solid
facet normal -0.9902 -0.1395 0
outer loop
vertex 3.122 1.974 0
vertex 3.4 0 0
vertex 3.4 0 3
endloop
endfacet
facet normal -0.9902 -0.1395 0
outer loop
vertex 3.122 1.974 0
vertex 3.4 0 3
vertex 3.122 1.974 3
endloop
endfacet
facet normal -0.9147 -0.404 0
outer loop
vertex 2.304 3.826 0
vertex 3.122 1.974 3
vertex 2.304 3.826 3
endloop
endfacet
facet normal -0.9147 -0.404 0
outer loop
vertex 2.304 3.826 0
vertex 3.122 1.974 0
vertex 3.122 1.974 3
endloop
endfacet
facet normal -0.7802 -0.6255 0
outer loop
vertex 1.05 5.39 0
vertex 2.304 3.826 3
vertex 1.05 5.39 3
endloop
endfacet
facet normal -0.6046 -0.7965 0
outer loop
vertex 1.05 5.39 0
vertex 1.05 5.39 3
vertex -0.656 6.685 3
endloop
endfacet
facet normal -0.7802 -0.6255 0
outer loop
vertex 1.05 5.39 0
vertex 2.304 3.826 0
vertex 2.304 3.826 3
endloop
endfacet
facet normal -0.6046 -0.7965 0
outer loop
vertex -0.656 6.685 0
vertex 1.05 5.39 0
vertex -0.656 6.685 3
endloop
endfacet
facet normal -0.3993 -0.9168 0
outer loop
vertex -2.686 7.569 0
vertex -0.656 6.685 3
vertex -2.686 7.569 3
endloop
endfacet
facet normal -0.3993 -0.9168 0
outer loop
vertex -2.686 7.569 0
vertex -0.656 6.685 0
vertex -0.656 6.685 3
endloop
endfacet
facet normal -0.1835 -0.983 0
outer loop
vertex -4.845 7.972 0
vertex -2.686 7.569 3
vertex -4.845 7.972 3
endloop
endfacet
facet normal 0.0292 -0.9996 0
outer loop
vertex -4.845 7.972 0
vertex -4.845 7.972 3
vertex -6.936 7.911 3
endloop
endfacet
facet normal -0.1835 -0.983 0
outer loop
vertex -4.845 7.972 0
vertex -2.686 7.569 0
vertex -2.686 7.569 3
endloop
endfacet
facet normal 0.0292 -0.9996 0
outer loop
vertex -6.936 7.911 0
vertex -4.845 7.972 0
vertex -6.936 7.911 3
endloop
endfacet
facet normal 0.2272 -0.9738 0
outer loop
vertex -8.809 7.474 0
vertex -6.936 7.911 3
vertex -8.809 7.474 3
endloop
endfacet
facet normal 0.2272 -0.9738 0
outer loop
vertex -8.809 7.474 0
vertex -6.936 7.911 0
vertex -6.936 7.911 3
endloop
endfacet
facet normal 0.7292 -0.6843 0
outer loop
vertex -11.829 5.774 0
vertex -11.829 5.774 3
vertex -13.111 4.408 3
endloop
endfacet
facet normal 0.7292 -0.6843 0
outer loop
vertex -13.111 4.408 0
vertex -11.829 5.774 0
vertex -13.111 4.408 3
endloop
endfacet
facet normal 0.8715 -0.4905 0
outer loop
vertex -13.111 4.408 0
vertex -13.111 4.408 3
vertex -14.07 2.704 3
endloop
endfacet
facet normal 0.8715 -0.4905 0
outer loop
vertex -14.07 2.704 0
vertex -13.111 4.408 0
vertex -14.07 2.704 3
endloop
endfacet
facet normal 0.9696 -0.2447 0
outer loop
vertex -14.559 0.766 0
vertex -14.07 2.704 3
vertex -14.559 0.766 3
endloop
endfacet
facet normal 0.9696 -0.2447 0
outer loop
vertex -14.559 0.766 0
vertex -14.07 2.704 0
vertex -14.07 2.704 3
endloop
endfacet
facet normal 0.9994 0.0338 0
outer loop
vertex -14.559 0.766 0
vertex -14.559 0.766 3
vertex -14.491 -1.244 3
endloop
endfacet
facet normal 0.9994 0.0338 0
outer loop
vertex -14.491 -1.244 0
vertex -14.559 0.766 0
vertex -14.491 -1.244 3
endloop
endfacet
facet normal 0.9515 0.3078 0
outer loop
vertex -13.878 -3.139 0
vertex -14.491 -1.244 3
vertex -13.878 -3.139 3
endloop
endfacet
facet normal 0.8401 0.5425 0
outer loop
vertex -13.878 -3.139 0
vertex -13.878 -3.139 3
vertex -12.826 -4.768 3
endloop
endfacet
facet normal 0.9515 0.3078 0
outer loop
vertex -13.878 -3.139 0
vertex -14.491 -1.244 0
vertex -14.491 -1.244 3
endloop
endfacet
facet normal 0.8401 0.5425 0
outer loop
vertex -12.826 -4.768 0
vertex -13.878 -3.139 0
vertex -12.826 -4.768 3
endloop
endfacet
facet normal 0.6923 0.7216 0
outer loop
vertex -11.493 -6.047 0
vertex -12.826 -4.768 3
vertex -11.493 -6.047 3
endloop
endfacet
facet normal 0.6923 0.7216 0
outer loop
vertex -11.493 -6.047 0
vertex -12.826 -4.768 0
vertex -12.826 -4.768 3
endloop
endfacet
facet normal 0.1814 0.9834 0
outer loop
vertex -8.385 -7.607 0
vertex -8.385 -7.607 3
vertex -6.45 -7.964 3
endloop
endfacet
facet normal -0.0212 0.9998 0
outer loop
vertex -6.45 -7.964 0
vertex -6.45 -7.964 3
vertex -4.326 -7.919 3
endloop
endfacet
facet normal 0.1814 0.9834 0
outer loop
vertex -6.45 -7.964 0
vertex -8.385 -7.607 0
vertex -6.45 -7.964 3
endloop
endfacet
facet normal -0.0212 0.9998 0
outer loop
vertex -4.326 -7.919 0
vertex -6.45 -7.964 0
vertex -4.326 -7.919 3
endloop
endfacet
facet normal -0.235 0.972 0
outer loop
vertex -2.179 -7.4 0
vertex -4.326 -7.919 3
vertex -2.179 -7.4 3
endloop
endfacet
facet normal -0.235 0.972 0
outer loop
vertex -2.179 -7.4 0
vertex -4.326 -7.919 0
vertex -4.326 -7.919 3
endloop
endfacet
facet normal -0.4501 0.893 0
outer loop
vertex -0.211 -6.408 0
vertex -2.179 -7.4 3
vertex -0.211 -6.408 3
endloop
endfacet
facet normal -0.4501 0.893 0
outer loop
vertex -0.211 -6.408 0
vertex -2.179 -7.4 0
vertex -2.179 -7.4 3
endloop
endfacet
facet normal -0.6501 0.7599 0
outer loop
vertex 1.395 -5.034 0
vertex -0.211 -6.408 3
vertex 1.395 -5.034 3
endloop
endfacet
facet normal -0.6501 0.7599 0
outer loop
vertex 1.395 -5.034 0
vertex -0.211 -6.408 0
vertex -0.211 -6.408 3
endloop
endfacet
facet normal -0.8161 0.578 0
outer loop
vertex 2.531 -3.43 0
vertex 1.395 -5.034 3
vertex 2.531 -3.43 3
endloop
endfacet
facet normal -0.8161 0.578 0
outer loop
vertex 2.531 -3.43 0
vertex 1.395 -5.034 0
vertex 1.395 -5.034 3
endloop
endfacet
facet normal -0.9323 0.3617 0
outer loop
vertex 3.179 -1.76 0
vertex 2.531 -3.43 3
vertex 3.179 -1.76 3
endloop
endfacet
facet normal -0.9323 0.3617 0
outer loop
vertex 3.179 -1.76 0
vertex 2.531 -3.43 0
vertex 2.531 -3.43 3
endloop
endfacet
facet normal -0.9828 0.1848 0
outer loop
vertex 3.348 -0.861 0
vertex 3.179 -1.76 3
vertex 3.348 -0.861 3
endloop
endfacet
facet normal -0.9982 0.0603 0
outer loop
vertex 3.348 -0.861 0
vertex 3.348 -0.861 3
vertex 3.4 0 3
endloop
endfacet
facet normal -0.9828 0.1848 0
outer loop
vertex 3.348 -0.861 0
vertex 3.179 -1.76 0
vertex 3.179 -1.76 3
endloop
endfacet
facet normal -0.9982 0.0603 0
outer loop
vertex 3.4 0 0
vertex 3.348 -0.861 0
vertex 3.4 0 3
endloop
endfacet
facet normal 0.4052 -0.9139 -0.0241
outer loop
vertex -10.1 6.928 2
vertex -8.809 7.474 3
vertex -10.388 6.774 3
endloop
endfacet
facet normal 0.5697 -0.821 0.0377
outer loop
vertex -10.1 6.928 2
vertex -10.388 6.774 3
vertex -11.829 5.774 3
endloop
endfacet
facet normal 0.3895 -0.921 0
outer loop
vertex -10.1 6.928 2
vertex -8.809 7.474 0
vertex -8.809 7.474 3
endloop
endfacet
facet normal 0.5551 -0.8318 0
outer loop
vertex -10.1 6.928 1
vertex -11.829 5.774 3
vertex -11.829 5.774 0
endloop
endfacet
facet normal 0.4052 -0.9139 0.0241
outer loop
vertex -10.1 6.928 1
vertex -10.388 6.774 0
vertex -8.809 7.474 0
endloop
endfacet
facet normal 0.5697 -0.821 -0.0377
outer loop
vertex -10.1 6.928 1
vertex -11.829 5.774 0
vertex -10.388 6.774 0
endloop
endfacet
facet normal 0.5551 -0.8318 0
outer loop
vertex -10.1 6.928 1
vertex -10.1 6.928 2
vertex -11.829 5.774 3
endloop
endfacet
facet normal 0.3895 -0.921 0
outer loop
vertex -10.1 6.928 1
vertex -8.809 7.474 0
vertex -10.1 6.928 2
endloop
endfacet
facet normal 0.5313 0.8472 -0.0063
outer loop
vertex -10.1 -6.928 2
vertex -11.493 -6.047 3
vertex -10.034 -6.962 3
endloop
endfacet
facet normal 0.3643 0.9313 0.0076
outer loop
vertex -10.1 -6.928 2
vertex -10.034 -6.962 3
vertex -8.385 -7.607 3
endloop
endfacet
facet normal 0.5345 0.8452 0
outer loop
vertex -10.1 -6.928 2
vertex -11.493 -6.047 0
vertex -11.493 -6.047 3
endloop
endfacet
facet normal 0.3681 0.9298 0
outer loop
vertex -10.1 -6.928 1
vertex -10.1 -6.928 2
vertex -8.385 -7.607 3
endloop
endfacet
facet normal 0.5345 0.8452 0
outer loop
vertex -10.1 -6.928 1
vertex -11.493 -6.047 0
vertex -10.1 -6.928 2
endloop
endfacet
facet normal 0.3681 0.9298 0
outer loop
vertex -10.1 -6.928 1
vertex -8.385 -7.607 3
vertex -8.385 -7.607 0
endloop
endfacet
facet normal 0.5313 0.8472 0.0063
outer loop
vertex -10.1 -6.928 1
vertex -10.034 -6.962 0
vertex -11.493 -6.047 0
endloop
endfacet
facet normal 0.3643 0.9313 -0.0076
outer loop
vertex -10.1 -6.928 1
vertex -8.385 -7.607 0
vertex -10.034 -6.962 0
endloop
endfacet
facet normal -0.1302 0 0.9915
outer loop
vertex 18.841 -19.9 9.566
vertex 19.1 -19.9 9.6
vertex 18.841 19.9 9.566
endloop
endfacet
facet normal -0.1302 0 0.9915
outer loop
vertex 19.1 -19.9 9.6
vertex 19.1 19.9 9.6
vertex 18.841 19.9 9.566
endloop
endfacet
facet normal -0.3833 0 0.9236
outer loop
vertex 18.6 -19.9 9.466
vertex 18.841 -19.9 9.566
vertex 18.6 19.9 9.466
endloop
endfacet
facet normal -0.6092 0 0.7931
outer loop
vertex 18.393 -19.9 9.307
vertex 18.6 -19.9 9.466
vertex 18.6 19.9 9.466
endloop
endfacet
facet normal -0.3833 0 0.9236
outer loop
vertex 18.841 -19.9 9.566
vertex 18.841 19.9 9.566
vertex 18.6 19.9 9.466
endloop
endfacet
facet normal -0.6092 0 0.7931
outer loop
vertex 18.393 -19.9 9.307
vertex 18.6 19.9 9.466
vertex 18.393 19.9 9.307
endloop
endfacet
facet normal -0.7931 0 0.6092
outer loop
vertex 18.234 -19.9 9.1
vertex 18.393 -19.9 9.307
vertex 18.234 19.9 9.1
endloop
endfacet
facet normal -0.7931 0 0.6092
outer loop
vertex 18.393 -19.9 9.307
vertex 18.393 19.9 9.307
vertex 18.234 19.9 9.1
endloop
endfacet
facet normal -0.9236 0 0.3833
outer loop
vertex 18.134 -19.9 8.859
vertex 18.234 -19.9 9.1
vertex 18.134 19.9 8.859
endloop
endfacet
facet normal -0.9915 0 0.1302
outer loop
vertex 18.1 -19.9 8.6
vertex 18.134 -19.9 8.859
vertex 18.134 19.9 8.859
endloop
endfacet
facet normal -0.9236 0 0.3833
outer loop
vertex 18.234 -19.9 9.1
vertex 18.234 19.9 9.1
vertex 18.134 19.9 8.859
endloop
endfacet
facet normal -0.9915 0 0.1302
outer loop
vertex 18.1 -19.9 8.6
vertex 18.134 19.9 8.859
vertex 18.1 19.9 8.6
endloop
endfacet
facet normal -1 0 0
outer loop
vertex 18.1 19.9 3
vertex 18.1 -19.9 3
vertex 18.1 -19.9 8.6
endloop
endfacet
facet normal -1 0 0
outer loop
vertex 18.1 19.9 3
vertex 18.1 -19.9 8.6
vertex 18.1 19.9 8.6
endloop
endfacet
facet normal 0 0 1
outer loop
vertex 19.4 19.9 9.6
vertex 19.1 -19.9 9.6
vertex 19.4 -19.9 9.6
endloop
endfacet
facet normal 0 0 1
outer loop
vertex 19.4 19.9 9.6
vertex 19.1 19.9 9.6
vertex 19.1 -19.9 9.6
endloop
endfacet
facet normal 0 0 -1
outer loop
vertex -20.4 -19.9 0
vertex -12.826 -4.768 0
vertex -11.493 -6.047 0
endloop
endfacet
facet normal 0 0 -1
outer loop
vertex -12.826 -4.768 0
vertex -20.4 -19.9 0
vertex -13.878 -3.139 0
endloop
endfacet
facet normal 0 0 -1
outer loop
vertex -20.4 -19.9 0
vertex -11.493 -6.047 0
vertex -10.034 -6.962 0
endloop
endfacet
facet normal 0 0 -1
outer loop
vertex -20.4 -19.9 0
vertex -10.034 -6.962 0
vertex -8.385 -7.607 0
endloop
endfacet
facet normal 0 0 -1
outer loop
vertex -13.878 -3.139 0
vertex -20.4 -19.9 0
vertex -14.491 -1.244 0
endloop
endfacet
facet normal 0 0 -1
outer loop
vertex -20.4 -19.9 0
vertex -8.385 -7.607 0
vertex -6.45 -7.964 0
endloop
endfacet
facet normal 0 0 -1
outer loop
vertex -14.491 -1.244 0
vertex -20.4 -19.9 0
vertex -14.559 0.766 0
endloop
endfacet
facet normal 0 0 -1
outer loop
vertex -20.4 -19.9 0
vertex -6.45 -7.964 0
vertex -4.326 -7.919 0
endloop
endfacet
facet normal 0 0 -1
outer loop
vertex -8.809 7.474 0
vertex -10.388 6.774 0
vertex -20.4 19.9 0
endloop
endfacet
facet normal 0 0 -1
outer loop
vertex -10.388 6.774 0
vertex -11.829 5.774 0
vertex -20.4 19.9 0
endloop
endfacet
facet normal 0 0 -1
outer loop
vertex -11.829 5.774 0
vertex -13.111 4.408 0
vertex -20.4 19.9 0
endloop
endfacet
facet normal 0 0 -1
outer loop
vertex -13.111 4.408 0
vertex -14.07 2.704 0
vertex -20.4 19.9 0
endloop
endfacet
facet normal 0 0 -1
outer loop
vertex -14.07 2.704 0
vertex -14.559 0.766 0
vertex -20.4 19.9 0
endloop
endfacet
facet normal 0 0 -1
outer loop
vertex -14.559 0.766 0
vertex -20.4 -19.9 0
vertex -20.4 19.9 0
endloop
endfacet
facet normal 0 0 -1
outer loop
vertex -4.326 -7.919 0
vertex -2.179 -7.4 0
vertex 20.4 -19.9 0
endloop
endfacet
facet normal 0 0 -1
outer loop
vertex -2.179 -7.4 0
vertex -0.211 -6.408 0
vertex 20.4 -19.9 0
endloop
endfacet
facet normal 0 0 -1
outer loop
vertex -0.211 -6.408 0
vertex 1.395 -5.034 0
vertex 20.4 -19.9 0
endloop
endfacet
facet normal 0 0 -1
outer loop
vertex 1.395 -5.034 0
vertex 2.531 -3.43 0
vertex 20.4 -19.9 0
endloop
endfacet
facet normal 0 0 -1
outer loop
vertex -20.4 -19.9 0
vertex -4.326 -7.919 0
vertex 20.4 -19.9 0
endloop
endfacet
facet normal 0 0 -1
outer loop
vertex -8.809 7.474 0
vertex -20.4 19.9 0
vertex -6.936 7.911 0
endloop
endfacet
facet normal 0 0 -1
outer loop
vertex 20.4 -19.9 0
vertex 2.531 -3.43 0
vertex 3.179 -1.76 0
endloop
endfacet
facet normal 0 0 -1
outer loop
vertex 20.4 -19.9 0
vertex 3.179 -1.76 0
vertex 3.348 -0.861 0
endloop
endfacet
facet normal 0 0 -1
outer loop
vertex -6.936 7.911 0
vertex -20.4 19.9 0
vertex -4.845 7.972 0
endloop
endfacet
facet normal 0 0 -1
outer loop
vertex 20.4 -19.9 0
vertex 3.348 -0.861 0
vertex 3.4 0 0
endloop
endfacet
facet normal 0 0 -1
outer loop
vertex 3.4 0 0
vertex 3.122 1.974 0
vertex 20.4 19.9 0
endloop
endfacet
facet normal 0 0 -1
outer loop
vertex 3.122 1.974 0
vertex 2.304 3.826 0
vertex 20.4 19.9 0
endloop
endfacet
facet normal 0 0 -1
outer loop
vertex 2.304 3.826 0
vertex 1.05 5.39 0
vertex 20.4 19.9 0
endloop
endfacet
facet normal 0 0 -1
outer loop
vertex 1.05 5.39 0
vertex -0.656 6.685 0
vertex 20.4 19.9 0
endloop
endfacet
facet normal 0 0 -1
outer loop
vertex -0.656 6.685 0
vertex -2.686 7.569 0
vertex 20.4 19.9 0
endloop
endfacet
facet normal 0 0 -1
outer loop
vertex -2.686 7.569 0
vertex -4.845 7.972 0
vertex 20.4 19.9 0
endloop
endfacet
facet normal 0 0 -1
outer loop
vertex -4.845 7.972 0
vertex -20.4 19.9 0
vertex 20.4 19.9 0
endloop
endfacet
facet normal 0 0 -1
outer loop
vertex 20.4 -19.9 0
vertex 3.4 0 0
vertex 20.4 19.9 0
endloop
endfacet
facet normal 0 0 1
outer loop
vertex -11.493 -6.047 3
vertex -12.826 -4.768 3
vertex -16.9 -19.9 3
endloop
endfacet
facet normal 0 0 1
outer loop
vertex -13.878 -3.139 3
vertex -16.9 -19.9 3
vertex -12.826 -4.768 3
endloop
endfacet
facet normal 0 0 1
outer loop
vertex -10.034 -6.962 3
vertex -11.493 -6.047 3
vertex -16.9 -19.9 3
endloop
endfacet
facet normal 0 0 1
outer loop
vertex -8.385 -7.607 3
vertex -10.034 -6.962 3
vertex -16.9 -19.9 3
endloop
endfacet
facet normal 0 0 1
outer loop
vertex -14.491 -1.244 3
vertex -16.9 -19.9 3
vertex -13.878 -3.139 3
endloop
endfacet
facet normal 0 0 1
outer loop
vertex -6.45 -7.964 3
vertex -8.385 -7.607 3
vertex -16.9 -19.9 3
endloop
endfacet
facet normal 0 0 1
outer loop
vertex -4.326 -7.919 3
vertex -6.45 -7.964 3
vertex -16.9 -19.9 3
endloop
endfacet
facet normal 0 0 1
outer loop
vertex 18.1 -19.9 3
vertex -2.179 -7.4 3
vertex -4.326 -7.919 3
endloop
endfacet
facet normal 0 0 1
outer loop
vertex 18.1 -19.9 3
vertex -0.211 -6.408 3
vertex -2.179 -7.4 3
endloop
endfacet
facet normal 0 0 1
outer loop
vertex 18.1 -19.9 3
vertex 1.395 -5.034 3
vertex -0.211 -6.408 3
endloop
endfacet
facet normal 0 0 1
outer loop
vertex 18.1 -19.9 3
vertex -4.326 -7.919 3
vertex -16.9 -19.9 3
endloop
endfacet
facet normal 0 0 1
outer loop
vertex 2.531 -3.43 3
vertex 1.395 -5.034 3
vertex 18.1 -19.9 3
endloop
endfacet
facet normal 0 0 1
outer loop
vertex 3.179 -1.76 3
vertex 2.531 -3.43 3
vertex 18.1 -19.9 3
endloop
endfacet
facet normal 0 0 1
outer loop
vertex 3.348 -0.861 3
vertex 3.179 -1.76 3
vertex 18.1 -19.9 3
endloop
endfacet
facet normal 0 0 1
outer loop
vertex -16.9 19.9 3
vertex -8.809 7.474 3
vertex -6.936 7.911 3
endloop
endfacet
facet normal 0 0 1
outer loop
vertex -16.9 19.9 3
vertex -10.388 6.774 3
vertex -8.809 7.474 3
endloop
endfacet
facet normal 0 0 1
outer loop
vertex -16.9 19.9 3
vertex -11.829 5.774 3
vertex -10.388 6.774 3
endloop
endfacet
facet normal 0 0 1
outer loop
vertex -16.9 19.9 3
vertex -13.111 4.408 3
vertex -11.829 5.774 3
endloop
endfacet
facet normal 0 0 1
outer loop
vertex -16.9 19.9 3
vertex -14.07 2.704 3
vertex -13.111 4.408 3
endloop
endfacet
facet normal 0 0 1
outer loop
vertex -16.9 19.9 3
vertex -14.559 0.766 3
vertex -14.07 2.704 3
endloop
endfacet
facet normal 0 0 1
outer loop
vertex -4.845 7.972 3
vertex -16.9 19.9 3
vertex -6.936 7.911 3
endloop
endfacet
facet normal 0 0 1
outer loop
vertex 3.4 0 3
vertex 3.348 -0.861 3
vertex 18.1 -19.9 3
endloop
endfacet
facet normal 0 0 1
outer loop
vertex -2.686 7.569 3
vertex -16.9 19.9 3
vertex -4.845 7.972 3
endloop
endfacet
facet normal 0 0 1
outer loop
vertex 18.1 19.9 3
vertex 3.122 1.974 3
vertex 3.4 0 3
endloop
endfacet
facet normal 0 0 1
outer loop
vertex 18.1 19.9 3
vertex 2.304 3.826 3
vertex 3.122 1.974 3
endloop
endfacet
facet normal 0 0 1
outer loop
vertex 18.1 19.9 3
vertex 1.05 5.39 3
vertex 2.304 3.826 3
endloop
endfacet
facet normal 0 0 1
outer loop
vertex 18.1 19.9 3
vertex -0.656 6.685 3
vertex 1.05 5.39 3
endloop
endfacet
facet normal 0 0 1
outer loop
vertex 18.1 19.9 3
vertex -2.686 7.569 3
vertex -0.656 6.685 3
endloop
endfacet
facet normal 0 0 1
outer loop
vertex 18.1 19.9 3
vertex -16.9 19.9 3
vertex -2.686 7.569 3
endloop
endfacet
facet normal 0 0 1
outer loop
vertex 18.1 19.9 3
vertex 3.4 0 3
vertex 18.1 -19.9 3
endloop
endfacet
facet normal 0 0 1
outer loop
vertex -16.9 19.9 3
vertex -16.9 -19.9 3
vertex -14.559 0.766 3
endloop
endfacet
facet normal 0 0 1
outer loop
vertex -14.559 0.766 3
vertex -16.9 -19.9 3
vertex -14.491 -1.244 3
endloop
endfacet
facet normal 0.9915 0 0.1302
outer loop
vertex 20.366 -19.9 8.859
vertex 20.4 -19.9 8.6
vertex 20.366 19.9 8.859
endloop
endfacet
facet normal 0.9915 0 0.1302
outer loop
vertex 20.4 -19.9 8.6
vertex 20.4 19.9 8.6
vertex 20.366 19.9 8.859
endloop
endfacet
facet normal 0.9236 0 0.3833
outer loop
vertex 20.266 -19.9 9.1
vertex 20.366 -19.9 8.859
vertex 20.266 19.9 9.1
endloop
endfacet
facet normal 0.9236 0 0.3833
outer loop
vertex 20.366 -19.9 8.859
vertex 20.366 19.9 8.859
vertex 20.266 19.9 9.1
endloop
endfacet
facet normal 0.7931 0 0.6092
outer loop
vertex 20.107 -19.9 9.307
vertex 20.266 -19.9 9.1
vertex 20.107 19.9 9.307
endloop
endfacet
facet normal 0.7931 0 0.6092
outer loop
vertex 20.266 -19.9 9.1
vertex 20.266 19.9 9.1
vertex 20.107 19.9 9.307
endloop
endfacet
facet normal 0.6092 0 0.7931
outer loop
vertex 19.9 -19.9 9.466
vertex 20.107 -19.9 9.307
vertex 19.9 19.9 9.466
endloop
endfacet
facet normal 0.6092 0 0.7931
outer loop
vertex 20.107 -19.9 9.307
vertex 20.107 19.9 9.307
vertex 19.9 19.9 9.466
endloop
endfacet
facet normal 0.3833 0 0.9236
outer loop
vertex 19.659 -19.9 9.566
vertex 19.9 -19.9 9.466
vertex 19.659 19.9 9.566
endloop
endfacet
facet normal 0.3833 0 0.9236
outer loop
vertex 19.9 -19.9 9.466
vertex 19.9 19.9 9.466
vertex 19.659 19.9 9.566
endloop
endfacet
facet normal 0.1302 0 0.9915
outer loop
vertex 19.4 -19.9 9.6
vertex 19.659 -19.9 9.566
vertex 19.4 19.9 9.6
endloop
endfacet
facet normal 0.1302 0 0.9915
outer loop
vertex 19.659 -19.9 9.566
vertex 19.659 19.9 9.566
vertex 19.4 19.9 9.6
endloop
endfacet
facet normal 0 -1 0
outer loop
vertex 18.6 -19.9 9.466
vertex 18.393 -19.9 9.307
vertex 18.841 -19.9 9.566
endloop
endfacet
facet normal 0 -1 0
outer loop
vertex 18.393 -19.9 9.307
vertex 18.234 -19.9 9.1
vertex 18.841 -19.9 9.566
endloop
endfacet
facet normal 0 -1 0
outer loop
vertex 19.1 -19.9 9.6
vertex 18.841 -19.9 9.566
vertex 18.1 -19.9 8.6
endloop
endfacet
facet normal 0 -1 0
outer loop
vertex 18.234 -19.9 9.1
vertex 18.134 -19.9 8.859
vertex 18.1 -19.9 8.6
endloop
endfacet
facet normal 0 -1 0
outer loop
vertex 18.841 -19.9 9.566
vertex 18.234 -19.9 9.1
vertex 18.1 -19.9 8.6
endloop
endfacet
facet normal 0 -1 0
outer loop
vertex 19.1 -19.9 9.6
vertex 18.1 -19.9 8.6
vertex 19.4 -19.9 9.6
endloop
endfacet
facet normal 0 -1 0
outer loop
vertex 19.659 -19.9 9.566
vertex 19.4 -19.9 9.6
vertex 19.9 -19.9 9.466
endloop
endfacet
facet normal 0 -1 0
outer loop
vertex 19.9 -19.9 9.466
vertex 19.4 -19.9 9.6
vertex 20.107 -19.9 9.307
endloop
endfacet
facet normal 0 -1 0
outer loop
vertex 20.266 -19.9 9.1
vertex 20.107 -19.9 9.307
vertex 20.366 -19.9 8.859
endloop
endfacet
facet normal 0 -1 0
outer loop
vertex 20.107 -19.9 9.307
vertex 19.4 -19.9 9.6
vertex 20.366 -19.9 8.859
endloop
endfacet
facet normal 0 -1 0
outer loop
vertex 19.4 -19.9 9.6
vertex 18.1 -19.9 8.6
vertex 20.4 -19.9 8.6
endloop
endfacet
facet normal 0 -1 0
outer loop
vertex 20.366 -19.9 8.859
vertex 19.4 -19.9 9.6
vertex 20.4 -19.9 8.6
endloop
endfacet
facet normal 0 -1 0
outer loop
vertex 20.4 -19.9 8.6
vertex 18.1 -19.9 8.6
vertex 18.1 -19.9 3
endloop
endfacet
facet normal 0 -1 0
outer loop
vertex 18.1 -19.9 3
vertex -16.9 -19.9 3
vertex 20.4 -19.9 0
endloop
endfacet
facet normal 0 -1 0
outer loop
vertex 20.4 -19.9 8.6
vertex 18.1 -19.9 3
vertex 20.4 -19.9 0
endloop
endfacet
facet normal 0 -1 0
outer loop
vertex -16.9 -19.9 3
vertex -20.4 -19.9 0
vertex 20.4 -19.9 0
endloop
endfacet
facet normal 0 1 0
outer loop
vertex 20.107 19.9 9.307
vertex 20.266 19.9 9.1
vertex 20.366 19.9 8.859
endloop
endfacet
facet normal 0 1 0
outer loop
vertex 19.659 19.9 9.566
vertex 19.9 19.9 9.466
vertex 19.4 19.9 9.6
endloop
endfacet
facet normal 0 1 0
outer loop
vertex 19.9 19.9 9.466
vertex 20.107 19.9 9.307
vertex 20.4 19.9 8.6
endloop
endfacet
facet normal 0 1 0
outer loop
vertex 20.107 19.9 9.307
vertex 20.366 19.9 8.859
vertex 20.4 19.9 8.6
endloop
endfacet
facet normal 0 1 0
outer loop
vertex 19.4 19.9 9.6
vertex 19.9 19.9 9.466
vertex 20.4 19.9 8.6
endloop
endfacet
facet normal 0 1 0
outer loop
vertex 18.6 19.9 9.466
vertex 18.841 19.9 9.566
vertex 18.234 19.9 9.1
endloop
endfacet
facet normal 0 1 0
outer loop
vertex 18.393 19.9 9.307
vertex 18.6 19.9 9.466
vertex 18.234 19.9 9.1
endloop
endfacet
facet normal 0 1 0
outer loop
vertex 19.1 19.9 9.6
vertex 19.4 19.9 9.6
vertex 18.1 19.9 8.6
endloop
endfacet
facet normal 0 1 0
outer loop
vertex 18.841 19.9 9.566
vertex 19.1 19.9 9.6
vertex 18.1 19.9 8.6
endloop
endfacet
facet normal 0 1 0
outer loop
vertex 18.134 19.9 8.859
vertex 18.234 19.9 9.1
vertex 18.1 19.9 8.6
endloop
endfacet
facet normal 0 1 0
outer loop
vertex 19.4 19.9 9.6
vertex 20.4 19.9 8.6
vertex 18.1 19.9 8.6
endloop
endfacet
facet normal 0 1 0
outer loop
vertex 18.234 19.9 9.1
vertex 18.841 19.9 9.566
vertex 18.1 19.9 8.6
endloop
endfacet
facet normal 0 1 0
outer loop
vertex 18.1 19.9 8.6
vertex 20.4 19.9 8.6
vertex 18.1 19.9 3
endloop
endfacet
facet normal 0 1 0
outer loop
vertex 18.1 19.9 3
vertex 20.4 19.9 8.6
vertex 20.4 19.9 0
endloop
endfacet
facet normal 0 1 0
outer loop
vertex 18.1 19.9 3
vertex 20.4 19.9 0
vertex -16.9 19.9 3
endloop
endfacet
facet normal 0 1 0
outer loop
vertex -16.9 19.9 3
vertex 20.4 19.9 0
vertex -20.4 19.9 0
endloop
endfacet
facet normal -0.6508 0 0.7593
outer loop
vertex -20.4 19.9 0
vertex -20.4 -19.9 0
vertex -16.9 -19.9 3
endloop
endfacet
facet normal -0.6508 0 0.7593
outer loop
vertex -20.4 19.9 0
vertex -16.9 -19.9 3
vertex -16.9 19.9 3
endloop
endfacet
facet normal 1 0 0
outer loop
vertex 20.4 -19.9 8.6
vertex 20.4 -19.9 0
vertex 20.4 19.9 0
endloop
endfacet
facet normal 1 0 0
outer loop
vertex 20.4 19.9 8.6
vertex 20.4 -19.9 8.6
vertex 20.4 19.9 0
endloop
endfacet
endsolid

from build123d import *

# Parameters (mm, degrees)
F0_W     = 38.5
F0_H     = 39.8
F0_W_2   = 2.3
F1_DEPTH = 3
F2_DEPTH = 9.6
F3_R     = 1
F4_SIZE2 = 2.99999
F4_SIZE  = 3.49999


# Not quite as in the source:
# - a fillet or chamfer is up to 0.001 mm smaller than in the source, because OpenCascade refuses the exact size


with BuildPart() as f1:
    # F0 (on Top) → F1 (new body)
    with BuildSketch(Plane.XY):
        with Locations((-1.15, 0)):
            Rectangle(F0_W, F0_H)
        with BuildLine():
            add(Edge.make_bspline(
                [(3.4, 0), (3.4, 13.8564064606), (-10.1, 6.9282032303), (-23.6, 0), (-10.1, -6.9282032303), (3.4, -13.8564064606), (3.4, 0)],
                knots=[0, 0, 0, 2.0943951024, 2.0943951024, 4.1887902048, 4.1887902048, 6.2831853072, 6.2831853072, 6.2831853072], degree=2, weights=[1, 0.5, 1, 0.5, 1, 0.5, 1]))
        make_face(mode=Mode.SUBTRACT)
        with Locations((19.25, 0)):
            Rectangle(F0_W_2, F0_H)
    extrude(amount=F1_DEPTH)

    # F0 (on Top) → F2 (join)
    with BuildSketch(Plane.XY):
        with Locations((19.25, 0)):
            Rectangle(F0_W_2, F0_H)
    extrude(amount=F2_DEPTH)

    # F3
    f3_edges = [f1.edges().sort_by_distance(p)[0] for p in [
        (18.1, 0, 9.6),
        (20.4, 0, 9.6),
    ]]
    fillet(f3_edges, radius=F3_R)

    # F4 (size 3.5 and 3 in the source; OpenCascade refuses exactly that, so slightly less here)
    f4_edges = [f1.edges().sort_by_distance(p)[0] for p in [
        (-20.4, 0, 3),
    ]]
    f4_side = f1.faces().sort_by_distance((-1.15, 19.346259, 3))[0]
    chamfer(f4_edges, length=F4_SIZE, length2=F4_SIZE2, reference=f4_side)


solid = f1.part
